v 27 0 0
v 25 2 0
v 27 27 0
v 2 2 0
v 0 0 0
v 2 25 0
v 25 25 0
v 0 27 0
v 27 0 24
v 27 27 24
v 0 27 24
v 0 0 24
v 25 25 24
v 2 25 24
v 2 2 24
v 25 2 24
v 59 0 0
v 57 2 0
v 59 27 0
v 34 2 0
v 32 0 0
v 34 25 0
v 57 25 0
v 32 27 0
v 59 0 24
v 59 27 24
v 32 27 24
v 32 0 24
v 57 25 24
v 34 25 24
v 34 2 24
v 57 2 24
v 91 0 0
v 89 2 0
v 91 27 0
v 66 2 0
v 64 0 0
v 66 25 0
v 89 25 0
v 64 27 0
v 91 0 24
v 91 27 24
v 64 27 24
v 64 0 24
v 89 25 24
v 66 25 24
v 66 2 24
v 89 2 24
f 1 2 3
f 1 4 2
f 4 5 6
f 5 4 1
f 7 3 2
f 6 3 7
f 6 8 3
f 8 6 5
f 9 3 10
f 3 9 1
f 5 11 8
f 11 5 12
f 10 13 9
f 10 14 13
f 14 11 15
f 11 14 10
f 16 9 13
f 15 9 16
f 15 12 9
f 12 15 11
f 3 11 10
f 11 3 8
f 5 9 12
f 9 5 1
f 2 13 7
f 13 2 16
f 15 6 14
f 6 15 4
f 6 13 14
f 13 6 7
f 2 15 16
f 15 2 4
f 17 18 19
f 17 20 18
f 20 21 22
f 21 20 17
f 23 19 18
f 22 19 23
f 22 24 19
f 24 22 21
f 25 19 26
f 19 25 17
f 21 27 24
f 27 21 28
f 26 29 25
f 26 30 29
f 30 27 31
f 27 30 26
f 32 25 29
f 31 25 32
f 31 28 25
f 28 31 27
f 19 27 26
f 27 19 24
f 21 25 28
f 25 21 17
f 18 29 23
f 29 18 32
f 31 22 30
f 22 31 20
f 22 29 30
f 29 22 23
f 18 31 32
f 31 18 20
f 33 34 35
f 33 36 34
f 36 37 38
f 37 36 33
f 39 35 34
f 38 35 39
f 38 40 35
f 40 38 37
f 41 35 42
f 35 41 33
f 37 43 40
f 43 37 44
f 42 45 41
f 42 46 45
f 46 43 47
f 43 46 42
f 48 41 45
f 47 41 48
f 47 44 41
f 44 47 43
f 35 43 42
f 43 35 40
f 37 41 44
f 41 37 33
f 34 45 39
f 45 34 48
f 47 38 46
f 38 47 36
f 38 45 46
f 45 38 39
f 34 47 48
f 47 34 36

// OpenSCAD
// file: params.scad
$fn = $preview ? 10 : 100;

del = 0.5;

// Servo dims
servo_length = 22;
servo_width = 12;
servo_depth = 10;
servo_height = 27;
servo_tab = 5;
servo_axel_diam = 5;

servo_spacing = 25;
servo_mount_length = servo_length + 10;
servo_mount_width = servo_spacing + servo_width + 10;
servo_mount_height = servo_depth * 3/2;
//servo_attach_length = 10;
servo_gear_shaft = 8;

// Connections between links
conn_outer = 23;
conn_inner = conn_outer - 4;
connector_width = conn_outer + 4;
servo_attach_width = conn_outer+2;

// Cable and flex guide routing
cable_d = 3;
flex_t = 3;
flex_w = conn_inner * 0.75;
base_thickness = 0.5;
spool_diam_o = 20;
spool_diam_i = spool_diam_o - 5;
spool_t = 6;
servo_attach_length = 32 - spool_diam_o;
conn_length = 2*servo_attach_length;

// Bend parameters
bend_length = 200;
bend_n = 25;
bend_link_diam = 5;
bend_width = 20;
bend_thickness = 10;
bend_twist = 20;

// Loop parameters
loop_outer = 20;
loop_inner = 15;
loop_length = 40;

// Latch parameters
pin_height = 24;
pin_diam = 7;
pin_act_diam = 3;
// file: helpers.scad
include <MCAD/triangles.scad>

eps = 0.01;

module triangle_2(b, h, d)
{
    rotate([-90, -90, 0])
    triangle(b/2, h, d);
    translate([eps, d, 0])
    rotate([-90, -90, 180])
    triangle(b/2, h, d);
}


module cutout_block(w, wi, d)
{
    difference()
    {
        cube([d, w, w]);
        translate([-eps, (w-wi)/2, (w-wi)/2])
        cube([d/2+eps, wi, wi]);
    }
};


module flared_cylinder(h, r, rb)
{
    cylinder(h=h, r=r);
    cylinder(h=(rb-r), r1=rb, r2=r);
    translate([0,0,h])
    rotate([180, 0, 0])
    cylinder(h=(rb-r), r1=rb, r2=r);
}


module connector(h_i, h_o, d)
{
    difference()
    {
        cube([d, h_o, h_o]);
        translate([
            -d/4,
            (h_o-h_i)/2,
            (h_o-h_i)/2
        ])
        cube([d*2, h_i, h_i]);
    }
}

module half_ring(h, r1, r2)
{
    difference()
    {
        difference()
        {
            cylinder(h=h, r=r1);
            translate([0,0,-h/4])
            cylinder(h=h*2, r=r2);
        }
        translate([0, -r1, -h/4])
        cube([r1*2, r1*2, h*2]);
    }
};
// main file
include <helpers.scad>
include <params.scad>

translate([0, 0, conn_length])
rotate([0, 90, 0])
connector(conn_outer, connector_width, conn_length);

translate([connector_width + 5, 0, conn_length])
rotate([0, 90, 0])
connector(conn_outer, connector_width, conn_length);

translate([(connector_width + 5)*2, 0, conn_length])
rotate([0, 90, 0])
connector(conn_outer, connector_width, conn_length);
